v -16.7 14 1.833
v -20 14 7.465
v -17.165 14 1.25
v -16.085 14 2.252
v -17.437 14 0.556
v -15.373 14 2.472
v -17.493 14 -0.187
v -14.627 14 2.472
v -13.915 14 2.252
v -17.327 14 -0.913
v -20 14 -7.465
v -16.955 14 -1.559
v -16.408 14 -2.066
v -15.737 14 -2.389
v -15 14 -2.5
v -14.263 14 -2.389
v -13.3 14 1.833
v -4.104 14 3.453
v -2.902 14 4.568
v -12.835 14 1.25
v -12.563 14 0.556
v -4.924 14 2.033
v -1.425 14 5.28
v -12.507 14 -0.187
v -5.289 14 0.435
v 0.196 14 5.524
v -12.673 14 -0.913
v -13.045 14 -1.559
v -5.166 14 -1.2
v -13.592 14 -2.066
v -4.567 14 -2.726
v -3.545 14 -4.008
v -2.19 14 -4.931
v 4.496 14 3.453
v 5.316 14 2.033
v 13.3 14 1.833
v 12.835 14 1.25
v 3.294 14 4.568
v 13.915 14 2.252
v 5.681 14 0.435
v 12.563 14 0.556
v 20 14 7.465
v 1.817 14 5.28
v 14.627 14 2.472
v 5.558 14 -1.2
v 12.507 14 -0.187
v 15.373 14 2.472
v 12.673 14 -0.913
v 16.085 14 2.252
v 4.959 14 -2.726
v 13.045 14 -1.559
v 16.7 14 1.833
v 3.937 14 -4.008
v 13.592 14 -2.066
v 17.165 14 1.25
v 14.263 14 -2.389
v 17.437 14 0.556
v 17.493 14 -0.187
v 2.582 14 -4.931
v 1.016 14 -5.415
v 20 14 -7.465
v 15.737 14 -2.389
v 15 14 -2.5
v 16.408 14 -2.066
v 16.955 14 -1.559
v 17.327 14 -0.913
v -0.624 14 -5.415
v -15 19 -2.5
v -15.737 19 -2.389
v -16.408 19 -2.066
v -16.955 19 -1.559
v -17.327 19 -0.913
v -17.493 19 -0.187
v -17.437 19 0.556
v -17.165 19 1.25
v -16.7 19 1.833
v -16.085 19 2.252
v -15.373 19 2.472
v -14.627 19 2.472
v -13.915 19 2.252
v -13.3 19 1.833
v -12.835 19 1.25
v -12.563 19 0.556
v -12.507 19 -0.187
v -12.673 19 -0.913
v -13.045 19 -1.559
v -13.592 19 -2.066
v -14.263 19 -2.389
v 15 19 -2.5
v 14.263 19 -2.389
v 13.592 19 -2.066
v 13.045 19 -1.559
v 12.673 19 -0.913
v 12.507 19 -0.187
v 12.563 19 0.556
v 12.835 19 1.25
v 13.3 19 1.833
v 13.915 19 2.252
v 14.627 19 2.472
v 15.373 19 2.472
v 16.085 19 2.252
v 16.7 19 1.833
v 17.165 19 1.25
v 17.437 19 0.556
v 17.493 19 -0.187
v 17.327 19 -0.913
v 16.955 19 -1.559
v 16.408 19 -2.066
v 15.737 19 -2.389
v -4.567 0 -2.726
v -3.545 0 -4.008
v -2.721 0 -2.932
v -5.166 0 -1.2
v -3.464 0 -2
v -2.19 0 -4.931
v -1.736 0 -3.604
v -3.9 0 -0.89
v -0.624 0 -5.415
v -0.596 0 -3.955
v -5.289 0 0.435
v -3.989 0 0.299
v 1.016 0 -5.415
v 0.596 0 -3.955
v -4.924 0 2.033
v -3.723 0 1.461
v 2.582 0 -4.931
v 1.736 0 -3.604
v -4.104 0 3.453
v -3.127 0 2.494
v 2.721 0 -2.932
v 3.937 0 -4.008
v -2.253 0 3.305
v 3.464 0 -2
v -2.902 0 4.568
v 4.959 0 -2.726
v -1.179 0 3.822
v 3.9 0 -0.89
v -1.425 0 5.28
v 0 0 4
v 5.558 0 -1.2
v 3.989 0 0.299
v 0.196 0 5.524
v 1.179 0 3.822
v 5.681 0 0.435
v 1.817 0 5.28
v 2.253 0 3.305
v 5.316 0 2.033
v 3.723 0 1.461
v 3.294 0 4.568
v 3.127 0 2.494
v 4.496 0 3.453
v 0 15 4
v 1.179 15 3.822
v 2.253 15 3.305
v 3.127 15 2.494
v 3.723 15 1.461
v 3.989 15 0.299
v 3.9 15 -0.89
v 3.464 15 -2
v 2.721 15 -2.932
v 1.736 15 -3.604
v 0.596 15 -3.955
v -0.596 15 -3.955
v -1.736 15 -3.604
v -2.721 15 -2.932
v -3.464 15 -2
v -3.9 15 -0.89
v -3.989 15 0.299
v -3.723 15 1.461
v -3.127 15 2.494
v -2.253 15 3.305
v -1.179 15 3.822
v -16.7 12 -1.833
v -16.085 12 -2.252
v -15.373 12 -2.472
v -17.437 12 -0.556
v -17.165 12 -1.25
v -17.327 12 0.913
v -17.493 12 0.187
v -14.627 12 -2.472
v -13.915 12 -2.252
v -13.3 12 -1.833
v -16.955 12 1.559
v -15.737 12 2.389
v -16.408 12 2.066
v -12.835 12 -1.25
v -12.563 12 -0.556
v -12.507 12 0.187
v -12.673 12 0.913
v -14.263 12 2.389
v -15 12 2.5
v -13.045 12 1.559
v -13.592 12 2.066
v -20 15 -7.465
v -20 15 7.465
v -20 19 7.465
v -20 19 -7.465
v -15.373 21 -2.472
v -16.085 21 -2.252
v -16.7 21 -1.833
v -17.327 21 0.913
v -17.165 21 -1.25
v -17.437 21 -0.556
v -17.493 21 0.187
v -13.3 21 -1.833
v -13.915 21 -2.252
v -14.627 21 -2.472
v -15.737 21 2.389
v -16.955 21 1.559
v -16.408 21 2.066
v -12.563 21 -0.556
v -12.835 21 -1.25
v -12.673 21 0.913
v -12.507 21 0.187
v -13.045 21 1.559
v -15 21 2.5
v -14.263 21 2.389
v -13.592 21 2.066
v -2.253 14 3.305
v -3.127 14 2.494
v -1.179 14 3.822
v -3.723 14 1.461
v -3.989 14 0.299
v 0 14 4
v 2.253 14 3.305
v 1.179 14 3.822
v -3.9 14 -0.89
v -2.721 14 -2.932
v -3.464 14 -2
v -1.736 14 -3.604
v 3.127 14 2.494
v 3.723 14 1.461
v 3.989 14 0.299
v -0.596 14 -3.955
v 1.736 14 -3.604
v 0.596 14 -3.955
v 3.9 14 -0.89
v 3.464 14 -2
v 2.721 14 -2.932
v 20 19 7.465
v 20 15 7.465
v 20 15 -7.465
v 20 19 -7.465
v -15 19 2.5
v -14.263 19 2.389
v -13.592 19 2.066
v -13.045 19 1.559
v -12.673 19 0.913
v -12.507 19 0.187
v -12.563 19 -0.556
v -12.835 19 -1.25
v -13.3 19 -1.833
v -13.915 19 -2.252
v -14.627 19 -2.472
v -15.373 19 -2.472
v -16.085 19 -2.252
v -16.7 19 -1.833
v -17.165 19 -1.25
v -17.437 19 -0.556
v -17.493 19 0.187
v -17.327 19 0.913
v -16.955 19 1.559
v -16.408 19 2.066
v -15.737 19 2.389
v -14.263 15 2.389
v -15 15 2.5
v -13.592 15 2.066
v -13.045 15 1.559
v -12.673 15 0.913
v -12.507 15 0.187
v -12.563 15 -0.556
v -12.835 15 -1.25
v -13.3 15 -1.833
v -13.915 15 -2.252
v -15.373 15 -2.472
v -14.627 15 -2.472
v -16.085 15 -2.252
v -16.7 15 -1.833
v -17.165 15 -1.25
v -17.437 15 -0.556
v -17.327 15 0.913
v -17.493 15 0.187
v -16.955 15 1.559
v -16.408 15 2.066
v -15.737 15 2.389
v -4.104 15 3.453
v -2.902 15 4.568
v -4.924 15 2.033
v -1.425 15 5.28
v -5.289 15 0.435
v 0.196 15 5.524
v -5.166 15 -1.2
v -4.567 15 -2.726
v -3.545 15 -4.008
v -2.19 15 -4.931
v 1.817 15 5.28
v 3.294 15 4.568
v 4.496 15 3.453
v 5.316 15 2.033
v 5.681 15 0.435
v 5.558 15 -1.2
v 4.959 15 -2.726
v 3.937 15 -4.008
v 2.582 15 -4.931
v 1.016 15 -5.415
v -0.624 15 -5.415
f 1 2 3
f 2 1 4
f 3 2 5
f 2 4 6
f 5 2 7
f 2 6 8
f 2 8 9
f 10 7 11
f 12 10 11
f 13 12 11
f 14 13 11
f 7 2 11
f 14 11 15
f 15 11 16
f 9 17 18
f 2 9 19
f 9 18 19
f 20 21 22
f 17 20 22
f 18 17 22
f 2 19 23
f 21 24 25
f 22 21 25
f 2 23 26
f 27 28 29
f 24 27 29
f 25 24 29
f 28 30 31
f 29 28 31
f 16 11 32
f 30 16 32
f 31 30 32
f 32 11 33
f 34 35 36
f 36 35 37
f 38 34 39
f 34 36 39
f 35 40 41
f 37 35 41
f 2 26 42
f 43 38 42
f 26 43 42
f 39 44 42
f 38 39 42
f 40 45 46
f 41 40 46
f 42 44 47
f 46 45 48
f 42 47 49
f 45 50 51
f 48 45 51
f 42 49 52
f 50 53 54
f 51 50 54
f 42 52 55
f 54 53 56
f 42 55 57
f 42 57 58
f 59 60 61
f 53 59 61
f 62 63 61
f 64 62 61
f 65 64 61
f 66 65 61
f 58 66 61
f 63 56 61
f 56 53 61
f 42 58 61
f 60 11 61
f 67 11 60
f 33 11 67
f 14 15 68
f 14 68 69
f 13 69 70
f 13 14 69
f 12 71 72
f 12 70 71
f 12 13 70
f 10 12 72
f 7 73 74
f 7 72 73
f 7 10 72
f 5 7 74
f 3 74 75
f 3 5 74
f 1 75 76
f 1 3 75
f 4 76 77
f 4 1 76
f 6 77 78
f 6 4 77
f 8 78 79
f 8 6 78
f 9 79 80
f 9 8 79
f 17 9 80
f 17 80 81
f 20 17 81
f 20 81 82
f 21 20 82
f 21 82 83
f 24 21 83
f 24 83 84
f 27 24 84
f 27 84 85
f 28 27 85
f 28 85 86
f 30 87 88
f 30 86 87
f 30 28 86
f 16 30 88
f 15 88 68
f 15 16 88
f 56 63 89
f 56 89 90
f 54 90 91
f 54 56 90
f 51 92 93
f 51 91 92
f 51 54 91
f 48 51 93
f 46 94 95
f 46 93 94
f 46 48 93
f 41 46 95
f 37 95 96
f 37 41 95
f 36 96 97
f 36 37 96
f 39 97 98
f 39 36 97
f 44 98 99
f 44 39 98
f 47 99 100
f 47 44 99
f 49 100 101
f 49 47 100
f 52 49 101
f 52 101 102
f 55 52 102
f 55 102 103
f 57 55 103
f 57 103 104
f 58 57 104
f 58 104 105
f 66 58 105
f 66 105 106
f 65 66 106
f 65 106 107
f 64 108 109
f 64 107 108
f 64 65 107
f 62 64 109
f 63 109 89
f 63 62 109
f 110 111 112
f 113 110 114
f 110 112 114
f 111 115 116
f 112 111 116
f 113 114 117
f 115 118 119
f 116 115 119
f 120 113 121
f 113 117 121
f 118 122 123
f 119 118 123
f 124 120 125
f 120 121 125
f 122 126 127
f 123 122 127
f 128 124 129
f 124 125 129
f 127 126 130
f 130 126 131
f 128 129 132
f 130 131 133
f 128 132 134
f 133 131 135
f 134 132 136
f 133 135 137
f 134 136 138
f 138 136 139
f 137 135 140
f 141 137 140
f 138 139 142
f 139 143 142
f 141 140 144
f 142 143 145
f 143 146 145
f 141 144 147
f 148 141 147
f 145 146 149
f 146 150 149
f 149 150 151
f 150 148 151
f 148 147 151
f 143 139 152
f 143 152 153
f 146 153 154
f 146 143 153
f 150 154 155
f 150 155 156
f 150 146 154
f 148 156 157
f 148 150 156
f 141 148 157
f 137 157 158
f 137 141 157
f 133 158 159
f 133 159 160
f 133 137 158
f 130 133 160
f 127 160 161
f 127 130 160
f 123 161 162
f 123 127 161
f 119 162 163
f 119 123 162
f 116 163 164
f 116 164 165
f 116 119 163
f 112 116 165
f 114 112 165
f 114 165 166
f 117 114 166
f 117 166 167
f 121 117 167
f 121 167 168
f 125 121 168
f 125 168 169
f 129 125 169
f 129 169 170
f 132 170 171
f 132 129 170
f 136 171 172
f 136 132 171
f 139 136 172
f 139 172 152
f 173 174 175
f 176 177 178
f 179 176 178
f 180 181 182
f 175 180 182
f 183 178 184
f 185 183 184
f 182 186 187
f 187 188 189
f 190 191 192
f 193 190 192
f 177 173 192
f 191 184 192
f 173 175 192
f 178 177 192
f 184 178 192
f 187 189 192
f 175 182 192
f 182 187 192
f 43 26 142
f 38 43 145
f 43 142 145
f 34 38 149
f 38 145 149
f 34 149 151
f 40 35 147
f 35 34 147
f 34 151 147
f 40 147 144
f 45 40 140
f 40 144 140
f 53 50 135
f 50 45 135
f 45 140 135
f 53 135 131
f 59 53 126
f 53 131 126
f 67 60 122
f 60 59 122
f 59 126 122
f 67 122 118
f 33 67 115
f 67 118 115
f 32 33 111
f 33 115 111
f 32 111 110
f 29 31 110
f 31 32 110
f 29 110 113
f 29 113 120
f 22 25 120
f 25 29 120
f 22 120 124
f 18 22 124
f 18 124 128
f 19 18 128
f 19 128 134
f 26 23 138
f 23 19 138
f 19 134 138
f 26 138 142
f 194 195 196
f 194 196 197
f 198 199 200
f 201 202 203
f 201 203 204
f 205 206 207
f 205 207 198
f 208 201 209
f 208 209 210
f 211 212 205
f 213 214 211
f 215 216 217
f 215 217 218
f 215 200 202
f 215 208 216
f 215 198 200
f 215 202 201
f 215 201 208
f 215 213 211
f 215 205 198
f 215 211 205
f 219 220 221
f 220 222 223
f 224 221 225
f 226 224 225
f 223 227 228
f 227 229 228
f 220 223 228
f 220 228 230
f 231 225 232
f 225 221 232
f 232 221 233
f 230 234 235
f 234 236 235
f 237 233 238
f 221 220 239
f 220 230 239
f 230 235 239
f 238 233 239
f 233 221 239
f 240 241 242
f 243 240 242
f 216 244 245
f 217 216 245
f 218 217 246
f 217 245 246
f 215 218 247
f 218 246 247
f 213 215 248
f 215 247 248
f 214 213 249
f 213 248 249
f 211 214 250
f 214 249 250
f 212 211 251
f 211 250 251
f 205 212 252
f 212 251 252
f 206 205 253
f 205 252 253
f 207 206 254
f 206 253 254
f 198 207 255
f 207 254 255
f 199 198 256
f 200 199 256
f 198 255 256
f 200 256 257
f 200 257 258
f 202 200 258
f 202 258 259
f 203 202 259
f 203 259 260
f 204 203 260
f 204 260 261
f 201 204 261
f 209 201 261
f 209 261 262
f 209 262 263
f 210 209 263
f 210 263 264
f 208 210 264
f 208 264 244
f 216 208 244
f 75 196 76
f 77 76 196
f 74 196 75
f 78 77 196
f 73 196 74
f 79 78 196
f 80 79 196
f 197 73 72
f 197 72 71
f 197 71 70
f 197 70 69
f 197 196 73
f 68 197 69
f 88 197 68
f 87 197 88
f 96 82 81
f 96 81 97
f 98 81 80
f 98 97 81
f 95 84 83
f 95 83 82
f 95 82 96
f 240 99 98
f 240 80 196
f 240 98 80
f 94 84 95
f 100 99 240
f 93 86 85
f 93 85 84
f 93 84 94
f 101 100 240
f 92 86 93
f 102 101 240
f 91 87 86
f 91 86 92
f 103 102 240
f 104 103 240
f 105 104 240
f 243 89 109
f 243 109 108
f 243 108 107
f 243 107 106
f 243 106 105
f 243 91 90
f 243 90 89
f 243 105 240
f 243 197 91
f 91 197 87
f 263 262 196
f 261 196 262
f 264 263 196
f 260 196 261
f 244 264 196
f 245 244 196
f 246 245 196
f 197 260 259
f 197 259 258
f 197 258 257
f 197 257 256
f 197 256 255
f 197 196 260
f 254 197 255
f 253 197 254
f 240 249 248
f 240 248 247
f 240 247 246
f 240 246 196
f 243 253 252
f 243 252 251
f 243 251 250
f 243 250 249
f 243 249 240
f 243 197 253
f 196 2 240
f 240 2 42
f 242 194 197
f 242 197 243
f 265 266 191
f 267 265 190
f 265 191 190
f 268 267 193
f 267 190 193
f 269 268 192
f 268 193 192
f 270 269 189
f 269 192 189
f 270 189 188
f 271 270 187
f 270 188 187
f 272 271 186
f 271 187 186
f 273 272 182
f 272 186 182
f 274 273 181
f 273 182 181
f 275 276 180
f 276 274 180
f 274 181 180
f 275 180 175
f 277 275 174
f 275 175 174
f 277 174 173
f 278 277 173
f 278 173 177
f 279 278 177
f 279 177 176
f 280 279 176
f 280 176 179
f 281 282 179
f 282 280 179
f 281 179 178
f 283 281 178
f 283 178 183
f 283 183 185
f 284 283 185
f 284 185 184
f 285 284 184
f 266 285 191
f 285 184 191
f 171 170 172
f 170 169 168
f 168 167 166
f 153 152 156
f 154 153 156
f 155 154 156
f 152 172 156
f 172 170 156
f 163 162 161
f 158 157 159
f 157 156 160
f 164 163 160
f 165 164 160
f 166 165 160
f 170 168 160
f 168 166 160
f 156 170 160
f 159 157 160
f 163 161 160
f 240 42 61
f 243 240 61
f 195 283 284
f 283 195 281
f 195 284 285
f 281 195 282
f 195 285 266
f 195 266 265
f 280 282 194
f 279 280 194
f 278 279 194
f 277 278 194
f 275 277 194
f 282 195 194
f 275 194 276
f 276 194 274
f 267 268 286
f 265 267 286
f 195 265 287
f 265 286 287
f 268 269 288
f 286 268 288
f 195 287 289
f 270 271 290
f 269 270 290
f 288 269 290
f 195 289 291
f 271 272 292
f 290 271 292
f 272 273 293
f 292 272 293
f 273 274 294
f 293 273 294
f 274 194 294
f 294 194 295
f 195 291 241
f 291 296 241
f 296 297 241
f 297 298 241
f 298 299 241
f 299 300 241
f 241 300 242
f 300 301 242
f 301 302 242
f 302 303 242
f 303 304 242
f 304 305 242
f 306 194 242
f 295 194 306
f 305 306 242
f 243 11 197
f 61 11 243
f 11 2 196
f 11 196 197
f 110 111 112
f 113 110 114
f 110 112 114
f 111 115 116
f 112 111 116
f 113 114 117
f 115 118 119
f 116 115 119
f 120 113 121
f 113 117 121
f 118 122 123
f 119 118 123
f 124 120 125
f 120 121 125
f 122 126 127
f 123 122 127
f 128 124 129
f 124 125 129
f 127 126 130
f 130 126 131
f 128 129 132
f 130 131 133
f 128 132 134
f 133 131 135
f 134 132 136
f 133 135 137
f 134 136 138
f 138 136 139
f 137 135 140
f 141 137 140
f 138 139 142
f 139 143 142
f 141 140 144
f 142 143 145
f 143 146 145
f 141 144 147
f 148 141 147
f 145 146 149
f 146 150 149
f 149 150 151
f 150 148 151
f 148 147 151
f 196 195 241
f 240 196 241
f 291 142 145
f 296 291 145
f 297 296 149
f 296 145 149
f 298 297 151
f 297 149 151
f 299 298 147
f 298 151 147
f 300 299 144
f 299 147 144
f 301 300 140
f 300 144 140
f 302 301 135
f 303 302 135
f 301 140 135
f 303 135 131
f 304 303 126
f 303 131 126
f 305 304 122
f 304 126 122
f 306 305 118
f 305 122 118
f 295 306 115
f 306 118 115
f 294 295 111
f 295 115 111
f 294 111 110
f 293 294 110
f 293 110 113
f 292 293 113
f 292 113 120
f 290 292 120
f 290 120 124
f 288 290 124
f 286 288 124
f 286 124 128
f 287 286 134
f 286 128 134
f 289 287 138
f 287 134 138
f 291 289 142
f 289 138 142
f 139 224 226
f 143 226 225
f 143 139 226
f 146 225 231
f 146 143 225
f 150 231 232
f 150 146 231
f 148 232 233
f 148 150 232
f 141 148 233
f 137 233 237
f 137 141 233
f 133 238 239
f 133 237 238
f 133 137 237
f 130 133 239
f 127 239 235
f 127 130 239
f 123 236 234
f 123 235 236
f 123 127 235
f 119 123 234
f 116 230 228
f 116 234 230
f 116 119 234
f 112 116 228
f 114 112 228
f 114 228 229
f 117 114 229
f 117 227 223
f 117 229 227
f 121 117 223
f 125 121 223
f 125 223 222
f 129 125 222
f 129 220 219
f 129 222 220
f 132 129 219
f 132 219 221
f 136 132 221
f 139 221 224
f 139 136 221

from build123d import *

# Parameters (mm, degrees)
SKETCH1_R                = 5.5
SKETCH1_R_2              = 4
BOSS_EXTRUDE1_DEPTH      = 15
BOSS_EXTRUDE2_DEPTH      = 4
BOSS_EXTRUDE2_DEPTH_BACK = 1
SKETCH3_W                = 40
SKETCH3_H                = 14.930774712
CUT_EXTRUDE1_DEPTH       = 9
CUT_EXTRUDE1_DEPTH_BACK  = 10
SKETCH3_4_R              = 2.5
CUT_EXTRUDE6_DEPTH       = 14
CUT_EXTRUDE6_DEPTH_BACK  = 12
SKETCH3_6_R              = 2.5
SKETCH1_2_R              = 5.5
SKETCH1_2_R_2            = 4
BOSS_EXTRUDE3_DEPTH      = 15
SKETCH3_15_W             = 40
SKETCH3_15_H             = 14.930774712
BOSS_EXTRUDE4_DEPTH      = 4
BOSS_EXTRUDE6_DEPTH      = 6
BOSS_EXTRUDE6_DEPTH_BACK = 3
SKETCH3_18_R             = 2.5


with BuildPart() as part:
    # Sketch1 → Boss-Extrude1 (new body)
    with BuildSketch(Plane(origin=(0, 0, 0), x_dir=(1, 0, 0), z_dir=(0, 1, 0))):
        with Locations((0.196069677, -0.023946328)):
            Circle(SKETCH1_R)
        Circle(SKETCH1_R_2, mode=Mode.SUBTRACT)
    extrude(amount=BOSS_EXTRUDE1_DEPTH)

    # Sketch3 → Boss-Extrude2 (add, two sides: drawn at the far end of the back side and taken through both)
    with BuildSketch(Plane(origin=(0, 15, 0), x_dir=(1, 0, 0), z_dir=(0, 1, 0)).offset(-BOSS_EXTRUDE2_DEPTH_BACK)):
        Rectangle(SKETCH3_W, SKETCH3_H)
    extrude(amount=BOSS_EXTRUDE2_DEPTH + BOSS_EXTRUDE2_DEPTH_BACK)

    # Sketch3<4> → Cut-Extrude1 (cut, two sides: drawn at the far end of the back side and taken through both)
    with BuildSketch(Plane(origin=(0, 15, 0), x_dir=(1, 0, 0), z_dir=(0, 1, 0)).offset(-CUT_EXTRUDE1_DEPTH_BACK)):
        with Locations((15, 0)):
            Circle(SKETCH3_4_R)
    extrude(amount=CUT_EXTRUDE1_DEPTH + CUT_EXTRUDE1_DEPTH_BACK, mode=Mode.SUBTRACT)

    # Sketch3<6> → Cut-Extrude6 (cut, two sides: drawn at the far end of the back side and taken through both)
    with BuildSketch(Plane(origin=(0, 15, 0), x_dir=(1, 0, 0), z_dir=(0, 1, 0)).offset(-CUT_EXTRUDE6_DEPTH_BACK)):
        with Locations((-15, 0)):
            Circle(SKETCH3_6_R)
    extrude(amount=CUT_EXTRUDE6_DEPTH + CUT_EXTRUDE6_DEPTH_BACK, mode=Mode.SUBTRACT)


with BuildPart() as body_2:
    # Sketch1<2> → Boss-Extrude3 (new body)
    with BuildSketch(Plane(origin=(0, 0, 0), x_dir=(1, 0, 0), z_dir=(0, 1, 0))):
        with Locations((0.196069677, -0.023946328)):
            Circle(SKETCH1_2_R)
        Circle(SKETCH1_2_R_2, mode=Mode.SUBTRACT)
    extrude(amount=BOSS_EXTRUDE3_DEPTH)

    # Sketch3<15> → Boss-Extrude4 (add)
    with BuildSketch(Plane(origin=(0, 15, 0), x_dir=(1, 0, 0), z_dir=(0, 1, 0))):
        Rectangle(SKETCH3_15_W, SKETCH3_15_H)
    extrude(amount=BOSS_EXTRUDE4_DEPTH)

    # Sketch3<18> → Boss-Extrude6 (add, two sides: drawn at the far end of the back side and taken through both)
    with BuildSketch(Plane(origin=(0, 15, 0), x_dir=(1, 0, 0), z_dir=(0, 1, 0)).offset(-BOSS_EXTRUDE6_DEPTH_BACK)):
        with Locations((-15, 0)):
            Circle(SKETCH3_18_R)
    extrude(amount=BOSS_EXTRUDE6_DEPTH + BOSS_EXTRUDE6_DEPTH_BACK)


solid = Compound([part.part, body_2.part])
